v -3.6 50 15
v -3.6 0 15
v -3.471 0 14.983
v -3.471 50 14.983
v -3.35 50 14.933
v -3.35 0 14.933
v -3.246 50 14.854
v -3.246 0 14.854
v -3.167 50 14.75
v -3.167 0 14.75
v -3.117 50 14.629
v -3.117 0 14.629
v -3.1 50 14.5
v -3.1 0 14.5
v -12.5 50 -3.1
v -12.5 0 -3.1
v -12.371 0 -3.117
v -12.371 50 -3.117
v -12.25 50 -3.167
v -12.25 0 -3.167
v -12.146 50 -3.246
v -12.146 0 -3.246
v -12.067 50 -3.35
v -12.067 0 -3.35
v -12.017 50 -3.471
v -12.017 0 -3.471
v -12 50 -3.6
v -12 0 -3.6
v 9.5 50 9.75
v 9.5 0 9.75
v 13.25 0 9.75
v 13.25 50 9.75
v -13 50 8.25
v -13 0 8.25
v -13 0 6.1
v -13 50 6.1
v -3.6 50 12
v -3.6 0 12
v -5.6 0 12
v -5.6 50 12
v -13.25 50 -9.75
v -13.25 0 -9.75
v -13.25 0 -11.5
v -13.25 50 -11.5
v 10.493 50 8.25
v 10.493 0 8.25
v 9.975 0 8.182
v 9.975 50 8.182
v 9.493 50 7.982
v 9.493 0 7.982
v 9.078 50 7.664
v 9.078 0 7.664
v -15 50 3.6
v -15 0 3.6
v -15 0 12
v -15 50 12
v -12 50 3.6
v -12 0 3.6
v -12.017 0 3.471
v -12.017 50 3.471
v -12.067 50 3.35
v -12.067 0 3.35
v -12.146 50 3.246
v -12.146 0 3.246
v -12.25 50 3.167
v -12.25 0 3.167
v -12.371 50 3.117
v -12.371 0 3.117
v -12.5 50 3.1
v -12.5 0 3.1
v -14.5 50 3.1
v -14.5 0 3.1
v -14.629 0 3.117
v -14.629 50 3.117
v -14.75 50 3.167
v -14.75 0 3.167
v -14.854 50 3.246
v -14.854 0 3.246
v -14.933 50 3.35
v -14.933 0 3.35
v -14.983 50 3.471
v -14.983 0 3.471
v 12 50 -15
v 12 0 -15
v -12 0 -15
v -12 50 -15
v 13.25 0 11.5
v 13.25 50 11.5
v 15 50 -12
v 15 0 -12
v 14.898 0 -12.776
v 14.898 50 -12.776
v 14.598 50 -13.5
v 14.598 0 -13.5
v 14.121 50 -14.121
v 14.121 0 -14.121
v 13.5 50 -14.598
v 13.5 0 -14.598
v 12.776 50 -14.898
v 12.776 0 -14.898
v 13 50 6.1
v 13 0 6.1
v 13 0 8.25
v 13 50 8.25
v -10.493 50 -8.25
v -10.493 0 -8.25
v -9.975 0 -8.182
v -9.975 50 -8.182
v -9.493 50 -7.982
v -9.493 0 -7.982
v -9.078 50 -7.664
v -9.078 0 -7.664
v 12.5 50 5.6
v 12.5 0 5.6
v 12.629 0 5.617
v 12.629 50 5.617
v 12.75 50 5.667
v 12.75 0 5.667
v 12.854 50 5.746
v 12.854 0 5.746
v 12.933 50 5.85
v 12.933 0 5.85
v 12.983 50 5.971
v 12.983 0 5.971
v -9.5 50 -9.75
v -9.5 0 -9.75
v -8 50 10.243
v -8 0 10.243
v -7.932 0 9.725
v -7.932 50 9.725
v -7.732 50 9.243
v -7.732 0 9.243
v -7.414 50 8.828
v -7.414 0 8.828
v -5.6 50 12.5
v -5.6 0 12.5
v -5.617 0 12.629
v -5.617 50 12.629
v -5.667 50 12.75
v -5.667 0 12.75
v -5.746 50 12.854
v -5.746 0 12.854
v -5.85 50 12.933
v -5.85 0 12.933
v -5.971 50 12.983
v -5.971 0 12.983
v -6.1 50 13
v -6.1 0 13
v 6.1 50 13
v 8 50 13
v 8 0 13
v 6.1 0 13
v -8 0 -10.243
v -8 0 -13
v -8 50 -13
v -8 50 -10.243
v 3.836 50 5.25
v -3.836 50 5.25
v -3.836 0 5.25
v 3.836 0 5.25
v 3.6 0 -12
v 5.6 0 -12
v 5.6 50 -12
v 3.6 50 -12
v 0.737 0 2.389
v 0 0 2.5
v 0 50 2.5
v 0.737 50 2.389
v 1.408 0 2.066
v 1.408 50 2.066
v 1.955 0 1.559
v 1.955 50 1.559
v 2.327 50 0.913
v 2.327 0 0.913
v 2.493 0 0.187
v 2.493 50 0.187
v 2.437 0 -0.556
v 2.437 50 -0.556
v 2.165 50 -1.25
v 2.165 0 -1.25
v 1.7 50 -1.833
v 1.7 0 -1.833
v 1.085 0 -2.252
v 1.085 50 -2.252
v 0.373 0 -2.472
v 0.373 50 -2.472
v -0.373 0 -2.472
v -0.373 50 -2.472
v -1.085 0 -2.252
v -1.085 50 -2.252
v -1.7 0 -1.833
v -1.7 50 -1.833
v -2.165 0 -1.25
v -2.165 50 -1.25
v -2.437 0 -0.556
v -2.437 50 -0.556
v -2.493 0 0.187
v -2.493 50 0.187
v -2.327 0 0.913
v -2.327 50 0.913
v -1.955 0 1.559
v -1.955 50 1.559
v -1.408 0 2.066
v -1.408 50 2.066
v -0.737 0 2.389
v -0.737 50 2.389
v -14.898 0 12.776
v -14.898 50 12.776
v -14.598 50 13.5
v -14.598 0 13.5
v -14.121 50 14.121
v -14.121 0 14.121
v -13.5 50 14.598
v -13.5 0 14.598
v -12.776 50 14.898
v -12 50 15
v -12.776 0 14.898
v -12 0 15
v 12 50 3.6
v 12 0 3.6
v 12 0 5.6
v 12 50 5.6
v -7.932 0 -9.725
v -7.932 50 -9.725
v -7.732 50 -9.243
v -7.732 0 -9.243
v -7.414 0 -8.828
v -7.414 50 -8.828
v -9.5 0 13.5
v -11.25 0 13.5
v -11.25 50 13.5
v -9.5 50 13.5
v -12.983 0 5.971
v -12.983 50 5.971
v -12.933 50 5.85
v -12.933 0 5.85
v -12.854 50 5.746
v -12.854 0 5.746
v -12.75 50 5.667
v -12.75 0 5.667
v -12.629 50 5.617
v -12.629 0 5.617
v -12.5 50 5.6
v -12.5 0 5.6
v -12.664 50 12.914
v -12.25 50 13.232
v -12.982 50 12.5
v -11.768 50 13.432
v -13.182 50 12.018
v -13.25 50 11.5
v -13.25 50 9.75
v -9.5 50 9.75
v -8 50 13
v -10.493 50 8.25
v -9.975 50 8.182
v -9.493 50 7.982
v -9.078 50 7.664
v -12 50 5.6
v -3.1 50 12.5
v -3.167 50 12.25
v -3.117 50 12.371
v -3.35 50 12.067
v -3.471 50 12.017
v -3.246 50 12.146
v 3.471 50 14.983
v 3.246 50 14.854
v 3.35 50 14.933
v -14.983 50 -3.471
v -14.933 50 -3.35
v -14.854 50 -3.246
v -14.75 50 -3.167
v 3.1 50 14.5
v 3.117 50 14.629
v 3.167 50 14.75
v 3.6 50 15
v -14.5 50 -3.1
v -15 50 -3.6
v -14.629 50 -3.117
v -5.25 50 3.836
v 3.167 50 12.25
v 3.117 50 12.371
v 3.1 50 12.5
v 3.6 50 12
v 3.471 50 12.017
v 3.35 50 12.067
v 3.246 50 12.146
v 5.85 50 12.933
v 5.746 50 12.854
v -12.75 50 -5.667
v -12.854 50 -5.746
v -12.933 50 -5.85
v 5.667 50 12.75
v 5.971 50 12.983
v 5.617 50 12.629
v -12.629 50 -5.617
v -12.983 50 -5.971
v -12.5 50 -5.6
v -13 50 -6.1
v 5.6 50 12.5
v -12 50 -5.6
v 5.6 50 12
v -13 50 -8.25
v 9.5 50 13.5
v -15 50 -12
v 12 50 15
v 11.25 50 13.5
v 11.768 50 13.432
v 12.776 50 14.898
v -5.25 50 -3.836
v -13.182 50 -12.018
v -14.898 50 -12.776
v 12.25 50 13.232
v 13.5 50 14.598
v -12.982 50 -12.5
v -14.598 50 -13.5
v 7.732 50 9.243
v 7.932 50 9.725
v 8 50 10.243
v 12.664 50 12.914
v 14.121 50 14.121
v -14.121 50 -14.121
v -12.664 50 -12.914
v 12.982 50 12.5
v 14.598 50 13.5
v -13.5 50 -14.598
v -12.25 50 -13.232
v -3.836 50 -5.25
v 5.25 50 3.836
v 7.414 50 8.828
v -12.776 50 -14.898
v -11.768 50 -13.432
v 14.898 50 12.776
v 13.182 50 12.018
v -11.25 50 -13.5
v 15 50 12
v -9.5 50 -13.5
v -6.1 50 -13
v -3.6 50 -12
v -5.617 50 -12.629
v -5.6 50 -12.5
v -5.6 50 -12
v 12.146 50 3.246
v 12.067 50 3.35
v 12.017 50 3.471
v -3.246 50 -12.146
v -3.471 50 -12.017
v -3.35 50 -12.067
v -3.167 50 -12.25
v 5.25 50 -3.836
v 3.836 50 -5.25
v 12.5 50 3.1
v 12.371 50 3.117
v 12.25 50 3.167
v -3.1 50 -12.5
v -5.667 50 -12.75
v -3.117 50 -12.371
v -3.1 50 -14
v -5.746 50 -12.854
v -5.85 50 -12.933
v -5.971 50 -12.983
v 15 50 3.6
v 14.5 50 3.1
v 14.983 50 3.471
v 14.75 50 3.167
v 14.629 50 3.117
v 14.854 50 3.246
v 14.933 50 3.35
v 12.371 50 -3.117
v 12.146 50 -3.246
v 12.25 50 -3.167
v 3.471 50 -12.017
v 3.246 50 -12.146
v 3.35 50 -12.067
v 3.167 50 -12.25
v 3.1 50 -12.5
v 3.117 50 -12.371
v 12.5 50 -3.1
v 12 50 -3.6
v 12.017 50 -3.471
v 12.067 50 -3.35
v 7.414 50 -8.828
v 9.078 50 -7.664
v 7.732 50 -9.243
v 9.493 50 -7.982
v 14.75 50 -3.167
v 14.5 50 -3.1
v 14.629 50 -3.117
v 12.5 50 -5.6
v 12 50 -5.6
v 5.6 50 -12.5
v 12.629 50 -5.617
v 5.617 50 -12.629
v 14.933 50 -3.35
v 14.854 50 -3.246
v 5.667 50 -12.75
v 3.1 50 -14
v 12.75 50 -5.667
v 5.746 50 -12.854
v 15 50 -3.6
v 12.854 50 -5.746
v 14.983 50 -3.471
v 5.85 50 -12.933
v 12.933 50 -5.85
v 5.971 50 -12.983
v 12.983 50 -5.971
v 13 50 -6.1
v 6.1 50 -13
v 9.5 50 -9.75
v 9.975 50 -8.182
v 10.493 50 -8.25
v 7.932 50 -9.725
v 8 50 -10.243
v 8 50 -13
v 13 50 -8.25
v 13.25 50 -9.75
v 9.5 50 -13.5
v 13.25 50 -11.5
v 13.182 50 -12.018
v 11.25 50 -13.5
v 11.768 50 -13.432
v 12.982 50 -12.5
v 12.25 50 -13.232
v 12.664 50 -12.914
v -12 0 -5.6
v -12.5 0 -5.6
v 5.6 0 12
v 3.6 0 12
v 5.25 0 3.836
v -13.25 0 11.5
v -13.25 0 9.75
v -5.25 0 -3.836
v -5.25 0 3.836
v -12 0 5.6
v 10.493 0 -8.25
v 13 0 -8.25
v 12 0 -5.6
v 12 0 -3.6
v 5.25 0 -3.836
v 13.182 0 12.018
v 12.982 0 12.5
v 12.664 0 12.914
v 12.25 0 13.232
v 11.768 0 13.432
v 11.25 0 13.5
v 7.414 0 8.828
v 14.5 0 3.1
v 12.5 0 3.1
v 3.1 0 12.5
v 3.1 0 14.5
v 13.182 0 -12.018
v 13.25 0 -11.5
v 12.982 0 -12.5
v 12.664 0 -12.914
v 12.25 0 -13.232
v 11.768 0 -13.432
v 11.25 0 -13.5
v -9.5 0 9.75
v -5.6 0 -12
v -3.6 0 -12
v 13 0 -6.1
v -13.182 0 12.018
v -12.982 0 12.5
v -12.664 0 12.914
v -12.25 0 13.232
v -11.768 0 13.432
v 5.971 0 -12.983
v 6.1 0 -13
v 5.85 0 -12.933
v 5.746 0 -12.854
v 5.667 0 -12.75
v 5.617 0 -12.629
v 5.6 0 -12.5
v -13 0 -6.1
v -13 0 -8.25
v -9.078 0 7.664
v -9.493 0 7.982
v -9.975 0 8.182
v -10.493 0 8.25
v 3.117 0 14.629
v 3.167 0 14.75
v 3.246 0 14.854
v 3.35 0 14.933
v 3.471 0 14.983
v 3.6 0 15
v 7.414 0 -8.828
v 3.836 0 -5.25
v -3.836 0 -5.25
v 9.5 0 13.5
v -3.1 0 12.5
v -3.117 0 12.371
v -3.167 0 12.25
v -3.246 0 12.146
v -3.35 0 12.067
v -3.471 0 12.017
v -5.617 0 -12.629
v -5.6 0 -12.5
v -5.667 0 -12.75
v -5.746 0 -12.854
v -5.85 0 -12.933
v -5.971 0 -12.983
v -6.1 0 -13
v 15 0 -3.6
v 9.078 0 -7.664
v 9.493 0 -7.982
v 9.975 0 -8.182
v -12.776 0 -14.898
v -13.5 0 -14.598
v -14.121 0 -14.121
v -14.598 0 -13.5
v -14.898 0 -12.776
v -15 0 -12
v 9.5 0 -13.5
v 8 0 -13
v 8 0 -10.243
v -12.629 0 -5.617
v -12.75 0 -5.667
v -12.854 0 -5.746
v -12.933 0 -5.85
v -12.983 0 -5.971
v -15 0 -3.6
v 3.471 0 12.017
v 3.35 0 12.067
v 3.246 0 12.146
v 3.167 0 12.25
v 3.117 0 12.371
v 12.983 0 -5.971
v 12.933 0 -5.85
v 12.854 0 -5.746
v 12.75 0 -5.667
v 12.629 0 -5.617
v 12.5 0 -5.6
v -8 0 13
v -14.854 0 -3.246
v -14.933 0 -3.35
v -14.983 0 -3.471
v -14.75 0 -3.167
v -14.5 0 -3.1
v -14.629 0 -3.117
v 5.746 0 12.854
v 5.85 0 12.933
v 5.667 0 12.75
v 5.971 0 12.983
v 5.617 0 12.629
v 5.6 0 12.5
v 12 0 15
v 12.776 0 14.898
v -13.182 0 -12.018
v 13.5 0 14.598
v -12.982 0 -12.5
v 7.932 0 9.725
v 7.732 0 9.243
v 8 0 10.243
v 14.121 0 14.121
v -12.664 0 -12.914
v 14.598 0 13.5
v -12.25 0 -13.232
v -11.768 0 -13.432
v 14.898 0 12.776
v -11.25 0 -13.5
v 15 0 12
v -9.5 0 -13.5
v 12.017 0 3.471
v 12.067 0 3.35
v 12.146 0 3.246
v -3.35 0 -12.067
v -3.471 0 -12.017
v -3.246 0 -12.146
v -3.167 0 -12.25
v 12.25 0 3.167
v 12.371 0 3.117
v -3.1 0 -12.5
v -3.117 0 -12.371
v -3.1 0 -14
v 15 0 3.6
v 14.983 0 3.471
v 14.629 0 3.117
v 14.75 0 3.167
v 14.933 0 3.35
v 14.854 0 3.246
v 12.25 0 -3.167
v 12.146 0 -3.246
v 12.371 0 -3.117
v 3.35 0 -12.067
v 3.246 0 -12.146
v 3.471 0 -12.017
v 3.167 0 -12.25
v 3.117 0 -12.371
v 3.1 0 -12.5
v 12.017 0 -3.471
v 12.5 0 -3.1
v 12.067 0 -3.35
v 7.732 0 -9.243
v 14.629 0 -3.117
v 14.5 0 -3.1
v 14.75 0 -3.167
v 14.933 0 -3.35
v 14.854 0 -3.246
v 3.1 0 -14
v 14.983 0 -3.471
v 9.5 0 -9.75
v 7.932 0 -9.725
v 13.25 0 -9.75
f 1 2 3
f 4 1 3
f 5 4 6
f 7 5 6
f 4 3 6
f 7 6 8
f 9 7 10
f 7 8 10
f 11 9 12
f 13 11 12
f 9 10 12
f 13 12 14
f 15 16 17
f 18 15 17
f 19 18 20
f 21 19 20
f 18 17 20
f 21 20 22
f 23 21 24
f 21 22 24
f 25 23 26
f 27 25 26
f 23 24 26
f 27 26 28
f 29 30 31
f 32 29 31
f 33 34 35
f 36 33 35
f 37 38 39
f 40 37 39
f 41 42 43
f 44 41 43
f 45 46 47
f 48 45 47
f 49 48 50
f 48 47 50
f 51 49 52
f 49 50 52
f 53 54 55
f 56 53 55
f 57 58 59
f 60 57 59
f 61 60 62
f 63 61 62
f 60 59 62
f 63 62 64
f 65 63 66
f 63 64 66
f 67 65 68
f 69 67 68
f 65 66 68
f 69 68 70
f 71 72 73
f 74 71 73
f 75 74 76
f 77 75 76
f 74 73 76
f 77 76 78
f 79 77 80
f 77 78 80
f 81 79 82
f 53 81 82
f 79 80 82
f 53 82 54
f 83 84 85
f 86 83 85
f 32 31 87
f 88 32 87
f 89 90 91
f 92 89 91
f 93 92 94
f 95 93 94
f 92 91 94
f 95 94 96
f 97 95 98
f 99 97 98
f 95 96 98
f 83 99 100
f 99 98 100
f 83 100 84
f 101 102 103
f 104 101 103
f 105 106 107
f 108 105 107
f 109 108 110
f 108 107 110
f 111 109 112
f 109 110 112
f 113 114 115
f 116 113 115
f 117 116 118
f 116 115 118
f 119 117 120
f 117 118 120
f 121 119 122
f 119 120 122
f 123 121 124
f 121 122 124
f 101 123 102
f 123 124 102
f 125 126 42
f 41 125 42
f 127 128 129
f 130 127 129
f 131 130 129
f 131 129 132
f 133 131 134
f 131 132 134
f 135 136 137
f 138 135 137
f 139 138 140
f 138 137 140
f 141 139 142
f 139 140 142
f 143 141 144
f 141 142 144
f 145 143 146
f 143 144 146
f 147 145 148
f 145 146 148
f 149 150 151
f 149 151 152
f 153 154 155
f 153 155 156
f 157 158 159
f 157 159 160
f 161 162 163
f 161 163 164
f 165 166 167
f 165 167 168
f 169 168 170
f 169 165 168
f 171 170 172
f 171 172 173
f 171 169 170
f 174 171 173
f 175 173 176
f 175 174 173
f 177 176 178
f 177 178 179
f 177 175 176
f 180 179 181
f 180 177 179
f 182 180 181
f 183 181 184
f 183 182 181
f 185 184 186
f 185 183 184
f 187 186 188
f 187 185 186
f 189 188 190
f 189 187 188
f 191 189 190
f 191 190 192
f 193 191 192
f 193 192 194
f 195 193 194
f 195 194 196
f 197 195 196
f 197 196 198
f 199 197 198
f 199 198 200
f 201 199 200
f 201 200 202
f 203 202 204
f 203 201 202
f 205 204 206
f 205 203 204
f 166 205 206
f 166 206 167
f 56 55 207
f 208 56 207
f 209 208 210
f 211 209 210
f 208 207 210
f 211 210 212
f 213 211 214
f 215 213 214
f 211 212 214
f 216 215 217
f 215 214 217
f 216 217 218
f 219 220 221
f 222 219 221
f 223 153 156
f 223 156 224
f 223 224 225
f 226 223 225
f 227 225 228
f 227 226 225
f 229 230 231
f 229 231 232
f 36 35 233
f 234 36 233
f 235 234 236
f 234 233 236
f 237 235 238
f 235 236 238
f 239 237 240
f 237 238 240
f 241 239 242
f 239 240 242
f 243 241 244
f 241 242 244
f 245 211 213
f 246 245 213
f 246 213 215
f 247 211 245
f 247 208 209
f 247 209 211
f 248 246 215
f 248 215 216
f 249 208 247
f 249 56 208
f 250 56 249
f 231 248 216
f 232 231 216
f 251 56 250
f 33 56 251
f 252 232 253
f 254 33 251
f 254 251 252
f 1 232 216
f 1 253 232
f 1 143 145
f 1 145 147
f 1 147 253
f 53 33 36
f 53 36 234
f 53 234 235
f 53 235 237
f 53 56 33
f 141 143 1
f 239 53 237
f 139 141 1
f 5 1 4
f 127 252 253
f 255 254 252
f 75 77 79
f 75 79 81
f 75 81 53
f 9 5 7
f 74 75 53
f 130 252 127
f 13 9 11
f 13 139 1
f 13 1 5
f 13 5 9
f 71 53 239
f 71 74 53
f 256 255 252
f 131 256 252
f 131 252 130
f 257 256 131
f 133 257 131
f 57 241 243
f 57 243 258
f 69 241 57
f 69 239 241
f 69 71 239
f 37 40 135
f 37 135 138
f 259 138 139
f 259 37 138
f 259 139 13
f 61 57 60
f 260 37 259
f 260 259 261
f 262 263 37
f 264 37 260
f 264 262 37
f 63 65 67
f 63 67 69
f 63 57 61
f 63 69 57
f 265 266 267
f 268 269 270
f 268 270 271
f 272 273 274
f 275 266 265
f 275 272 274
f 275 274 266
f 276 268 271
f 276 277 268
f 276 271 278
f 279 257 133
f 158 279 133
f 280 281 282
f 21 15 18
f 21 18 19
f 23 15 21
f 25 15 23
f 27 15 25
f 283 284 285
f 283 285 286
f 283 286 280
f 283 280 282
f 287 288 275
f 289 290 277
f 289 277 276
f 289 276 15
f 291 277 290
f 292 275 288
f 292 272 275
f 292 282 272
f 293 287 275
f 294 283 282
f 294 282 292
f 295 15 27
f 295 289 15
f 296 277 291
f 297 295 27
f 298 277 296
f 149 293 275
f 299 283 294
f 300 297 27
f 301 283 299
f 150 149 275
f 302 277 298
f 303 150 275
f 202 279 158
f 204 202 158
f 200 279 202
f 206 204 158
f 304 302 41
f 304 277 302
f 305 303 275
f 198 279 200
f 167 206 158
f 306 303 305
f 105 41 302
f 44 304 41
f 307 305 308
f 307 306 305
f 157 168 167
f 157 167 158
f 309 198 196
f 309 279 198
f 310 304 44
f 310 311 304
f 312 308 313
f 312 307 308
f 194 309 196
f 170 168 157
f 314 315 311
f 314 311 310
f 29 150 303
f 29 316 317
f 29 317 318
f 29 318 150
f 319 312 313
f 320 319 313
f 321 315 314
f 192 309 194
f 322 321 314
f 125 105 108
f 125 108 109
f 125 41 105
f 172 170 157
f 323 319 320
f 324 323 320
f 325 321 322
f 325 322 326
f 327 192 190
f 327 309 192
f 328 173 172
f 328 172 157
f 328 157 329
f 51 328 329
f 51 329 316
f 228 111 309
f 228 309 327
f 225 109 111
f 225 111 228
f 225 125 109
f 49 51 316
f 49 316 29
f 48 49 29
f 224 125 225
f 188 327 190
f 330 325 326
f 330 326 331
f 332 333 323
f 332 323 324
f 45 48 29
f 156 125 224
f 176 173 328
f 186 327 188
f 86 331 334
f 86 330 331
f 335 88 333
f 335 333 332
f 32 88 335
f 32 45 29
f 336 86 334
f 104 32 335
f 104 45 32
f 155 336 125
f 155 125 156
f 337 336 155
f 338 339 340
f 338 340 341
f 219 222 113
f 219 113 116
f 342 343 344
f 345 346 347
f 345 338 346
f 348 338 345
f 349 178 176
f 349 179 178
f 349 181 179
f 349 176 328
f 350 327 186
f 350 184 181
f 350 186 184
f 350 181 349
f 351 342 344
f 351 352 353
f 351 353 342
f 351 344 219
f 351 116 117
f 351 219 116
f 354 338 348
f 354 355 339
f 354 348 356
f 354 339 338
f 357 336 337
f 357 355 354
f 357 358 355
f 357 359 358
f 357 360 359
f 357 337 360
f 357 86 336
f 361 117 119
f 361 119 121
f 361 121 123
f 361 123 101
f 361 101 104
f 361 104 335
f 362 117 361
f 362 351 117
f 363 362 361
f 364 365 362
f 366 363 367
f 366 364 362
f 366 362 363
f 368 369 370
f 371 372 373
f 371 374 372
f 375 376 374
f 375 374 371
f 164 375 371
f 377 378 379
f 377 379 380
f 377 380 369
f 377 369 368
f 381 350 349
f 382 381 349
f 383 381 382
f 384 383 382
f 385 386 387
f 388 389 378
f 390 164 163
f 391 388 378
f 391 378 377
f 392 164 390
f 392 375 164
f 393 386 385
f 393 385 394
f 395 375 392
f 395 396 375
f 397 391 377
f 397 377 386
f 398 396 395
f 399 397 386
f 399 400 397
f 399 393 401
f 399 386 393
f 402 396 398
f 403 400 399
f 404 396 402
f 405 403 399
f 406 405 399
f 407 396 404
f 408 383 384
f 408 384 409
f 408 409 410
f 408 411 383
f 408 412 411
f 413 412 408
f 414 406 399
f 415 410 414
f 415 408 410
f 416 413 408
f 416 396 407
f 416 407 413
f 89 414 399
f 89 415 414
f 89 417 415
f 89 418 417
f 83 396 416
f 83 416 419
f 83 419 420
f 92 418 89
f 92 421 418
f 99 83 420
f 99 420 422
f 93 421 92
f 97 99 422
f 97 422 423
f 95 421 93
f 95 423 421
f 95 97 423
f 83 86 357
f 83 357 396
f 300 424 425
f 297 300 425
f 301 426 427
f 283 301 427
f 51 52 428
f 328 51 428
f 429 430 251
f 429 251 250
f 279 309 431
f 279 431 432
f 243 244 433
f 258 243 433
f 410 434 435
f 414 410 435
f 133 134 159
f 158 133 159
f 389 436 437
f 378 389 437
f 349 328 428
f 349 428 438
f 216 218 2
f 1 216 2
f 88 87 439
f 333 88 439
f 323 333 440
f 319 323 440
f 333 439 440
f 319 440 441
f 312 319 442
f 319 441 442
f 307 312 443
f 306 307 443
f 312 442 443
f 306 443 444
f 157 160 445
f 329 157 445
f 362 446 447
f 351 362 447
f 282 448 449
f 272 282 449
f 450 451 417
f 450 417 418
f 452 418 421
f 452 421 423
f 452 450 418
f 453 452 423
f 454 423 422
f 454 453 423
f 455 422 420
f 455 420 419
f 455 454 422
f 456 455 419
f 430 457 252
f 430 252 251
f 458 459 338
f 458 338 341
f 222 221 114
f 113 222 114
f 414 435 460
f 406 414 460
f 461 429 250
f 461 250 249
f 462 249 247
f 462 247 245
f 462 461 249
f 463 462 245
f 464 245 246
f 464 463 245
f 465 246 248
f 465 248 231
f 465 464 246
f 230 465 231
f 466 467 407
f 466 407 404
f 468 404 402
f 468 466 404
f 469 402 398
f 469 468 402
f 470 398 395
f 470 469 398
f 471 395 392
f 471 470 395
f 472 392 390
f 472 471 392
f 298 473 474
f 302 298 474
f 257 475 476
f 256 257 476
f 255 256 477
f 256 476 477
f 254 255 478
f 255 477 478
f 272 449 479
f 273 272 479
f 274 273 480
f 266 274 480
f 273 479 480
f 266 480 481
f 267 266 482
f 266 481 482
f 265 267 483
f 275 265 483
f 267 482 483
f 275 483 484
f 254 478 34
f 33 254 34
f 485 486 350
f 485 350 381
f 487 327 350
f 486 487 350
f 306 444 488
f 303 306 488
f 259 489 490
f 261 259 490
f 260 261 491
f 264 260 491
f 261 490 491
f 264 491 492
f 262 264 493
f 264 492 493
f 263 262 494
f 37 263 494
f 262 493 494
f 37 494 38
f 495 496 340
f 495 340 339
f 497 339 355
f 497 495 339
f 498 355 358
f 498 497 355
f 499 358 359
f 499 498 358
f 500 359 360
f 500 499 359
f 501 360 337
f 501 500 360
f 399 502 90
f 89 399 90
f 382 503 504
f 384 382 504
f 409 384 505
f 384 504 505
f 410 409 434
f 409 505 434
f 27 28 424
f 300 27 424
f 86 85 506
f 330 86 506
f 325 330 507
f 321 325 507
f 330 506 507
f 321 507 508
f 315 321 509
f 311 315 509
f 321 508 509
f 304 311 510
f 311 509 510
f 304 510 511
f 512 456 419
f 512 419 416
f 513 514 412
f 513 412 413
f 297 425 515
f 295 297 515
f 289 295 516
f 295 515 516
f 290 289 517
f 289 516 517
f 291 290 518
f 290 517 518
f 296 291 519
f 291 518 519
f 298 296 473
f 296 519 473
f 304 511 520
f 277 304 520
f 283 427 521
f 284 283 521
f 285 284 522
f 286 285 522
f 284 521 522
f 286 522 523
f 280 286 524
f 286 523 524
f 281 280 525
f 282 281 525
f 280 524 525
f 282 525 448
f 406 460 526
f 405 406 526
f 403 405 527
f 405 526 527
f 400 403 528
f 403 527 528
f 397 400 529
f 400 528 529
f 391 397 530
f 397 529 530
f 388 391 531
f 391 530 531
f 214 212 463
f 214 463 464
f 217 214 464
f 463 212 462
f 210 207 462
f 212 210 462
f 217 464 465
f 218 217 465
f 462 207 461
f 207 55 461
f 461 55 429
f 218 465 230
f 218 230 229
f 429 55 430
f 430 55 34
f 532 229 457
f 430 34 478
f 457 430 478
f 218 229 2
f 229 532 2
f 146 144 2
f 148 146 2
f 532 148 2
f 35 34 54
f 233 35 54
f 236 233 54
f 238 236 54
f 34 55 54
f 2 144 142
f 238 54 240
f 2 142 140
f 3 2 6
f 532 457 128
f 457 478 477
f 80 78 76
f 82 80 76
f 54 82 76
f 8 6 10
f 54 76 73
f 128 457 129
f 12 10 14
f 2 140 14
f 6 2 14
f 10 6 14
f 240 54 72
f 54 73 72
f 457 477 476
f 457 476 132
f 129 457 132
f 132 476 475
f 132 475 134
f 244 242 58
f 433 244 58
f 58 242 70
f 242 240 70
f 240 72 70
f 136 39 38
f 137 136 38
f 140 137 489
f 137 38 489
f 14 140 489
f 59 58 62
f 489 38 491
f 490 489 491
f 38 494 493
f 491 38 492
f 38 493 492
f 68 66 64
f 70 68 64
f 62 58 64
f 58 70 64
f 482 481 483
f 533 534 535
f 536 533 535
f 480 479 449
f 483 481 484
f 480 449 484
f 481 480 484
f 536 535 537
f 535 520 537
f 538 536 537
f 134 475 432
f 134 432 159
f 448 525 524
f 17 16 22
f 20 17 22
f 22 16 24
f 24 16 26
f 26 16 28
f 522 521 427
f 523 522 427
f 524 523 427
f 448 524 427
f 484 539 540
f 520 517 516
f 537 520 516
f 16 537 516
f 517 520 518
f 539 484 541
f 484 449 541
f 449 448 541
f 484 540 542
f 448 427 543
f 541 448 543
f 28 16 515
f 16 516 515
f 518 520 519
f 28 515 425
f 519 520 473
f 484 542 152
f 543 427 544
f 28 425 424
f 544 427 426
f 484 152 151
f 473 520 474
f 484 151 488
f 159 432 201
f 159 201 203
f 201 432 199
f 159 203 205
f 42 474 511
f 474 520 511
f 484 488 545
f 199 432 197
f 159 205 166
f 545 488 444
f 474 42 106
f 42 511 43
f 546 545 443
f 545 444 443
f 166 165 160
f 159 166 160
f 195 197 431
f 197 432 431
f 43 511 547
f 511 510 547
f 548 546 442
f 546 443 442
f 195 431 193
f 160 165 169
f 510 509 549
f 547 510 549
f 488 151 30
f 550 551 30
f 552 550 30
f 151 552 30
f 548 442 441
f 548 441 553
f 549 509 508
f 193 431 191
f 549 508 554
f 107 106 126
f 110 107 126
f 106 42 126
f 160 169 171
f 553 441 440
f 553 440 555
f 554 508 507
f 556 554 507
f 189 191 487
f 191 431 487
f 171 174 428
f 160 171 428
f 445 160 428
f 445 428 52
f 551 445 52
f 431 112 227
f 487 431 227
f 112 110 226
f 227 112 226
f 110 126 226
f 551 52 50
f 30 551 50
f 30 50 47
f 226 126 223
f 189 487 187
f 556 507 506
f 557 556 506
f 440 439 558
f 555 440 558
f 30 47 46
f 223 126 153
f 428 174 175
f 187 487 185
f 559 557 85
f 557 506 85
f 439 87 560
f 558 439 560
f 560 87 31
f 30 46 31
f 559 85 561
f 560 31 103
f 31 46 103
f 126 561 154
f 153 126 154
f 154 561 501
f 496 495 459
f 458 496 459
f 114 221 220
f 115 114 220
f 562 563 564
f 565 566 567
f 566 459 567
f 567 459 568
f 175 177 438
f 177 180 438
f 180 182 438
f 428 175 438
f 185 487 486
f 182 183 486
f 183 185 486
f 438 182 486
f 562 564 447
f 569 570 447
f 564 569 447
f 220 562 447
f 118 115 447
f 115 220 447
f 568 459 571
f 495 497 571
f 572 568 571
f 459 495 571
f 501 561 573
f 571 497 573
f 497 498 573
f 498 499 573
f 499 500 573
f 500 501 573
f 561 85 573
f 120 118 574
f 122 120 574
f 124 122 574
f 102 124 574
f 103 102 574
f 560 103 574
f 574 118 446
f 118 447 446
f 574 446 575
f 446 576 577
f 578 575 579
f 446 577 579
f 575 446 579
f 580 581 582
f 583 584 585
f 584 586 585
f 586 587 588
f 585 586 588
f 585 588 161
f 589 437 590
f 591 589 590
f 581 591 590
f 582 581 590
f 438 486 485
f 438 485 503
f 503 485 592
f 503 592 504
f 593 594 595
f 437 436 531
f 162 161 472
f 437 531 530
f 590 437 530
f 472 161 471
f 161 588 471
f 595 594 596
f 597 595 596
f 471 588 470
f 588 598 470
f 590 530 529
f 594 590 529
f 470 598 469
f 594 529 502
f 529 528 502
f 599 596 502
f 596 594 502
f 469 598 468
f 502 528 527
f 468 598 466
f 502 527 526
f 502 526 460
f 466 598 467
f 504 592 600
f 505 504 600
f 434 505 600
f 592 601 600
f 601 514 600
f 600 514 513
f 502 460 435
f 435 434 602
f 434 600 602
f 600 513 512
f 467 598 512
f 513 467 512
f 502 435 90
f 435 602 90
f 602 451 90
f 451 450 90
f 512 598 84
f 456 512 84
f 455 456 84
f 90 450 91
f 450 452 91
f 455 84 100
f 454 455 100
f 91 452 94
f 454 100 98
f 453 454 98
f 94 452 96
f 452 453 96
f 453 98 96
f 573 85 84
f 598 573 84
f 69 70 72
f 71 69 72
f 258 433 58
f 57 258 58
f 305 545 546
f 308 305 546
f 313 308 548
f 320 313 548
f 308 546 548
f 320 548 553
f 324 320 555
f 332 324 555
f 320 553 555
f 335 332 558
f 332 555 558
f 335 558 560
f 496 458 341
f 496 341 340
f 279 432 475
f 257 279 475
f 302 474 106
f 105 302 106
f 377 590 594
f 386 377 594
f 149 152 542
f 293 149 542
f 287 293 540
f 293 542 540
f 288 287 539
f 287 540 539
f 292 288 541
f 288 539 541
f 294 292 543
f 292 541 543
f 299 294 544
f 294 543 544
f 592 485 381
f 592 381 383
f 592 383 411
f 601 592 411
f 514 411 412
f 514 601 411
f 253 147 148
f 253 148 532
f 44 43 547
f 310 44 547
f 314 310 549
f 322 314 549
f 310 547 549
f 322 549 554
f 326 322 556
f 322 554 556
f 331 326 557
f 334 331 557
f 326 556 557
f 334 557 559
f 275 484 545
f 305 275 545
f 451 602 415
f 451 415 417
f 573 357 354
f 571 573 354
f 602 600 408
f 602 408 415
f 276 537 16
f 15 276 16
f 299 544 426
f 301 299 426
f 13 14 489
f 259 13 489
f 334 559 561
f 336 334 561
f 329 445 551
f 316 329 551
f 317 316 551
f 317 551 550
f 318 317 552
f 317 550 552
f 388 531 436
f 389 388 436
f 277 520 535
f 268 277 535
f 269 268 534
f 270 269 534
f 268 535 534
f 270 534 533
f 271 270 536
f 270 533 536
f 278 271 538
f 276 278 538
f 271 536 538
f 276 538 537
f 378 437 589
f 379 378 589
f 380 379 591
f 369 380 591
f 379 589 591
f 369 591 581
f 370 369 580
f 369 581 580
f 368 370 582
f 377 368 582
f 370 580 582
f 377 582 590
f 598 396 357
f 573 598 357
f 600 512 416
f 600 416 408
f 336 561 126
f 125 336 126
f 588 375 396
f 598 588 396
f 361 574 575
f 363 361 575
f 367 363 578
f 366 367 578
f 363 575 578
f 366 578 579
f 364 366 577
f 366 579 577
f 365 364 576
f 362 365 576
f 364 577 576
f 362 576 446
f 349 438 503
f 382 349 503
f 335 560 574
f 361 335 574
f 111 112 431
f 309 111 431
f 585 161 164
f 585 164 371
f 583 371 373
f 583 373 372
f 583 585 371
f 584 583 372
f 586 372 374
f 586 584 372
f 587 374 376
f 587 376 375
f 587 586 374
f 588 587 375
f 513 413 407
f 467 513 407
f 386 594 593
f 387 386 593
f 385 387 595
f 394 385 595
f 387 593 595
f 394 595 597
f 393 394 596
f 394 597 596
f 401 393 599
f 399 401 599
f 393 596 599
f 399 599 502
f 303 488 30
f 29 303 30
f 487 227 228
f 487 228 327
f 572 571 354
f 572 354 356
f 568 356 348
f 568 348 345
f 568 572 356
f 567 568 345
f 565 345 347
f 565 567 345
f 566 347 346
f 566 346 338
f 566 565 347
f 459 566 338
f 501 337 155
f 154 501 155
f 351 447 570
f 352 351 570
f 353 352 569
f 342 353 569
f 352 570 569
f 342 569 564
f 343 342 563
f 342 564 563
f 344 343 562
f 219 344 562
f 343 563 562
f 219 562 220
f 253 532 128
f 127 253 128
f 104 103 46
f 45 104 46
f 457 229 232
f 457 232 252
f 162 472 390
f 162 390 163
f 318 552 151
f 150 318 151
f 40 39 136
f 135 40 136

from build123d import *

# Parameters (mm, degrees)
SKETCH2_R           = 2.5
BOSS_EXTRUDE1_DEPTH = 50


with BuildPart() as part:
    # Sketch2 → Boss-Extrude1 (new body)
    with BuildSketch(Plane(origin=(0, 0, 0), x_dir=(1, 0, 0), z_dir=(0, 1, 0))):
        with BuildLine():
            Line((3.6, -15), (12, -15))
            ThreePointArc((12, -15), (14.121320344, -14.121320344), (15, -12))
            Line((15, -12), (15, -3.6))
            ThreePointArc((15, -3.6), (14.853553391, -3.246446609), (14.5, -3.1))
            Line((14.5, -3.1), (12.5, -3.1))
            ThreePointArc((12.5, -3.1), (12.146446609, -3.246446609), (12, -3.6))
            Line((12, -3.6), (12, -5.6))
            Line((12, -5.6), (12.5, -5.6))
            ThreePointArc((12.5, -5.6), (12.853553391, -5.746446609), (13, -6.1))
            Line((13, -6.1), (13, -8.25))
            Line((13, -8.25), (10.492640687, -8.25))
            ThreePointArc((10.492640687, -8.25), (9.727273822, -8.097759065), (9.078427125, -7.664213562))
            Line((9.078427125, -7.664213562), (5.25, -3.835786438))
            Line((5.25, -3.835786438), (5.25, 3.835786438))
            Line((5.25, 3.835786438), (9.078427125, 7.664213562))
            ThreePointArc((9.078427125, 7.664213562), (9.727273822, 8.097759065), (10.492640687, 8.25))
            Line((10.492640687, 8.25), (13, 8.25))
            Line((13, 8.25), (13, 6.1))
            ThreePointArc((13, 6.1), (12.853553391, 5.746446609), (12.5, 5.6))
            Line((12.5, 5.6), (12, 5.6))
            Line((12, 5.6), (12, 3.6))
            ThreePointArc((12, 3.6), (12.146446609, 3.246446609), (12.5, 3.1))
            Line((12.5, 3.1), (14.5, 3.1))
            ThreePointArc((14.5, 3.1), (14.853553391, 3.246446609), (15, 3.6))
            Line((15, 3.6), (15, 12))
            ThreePointArc((15, 12), (14.121320344, 14.121320344), (12, 15))
            Line((12, 15), (-12, 15))
            ThreePointArc((-12, 15), (-14.121320344, 14.121320344), (-15, 12))
            Line((-15, 12), (-15, 3.6))
            ThreePointArc((-15, 3.6), (-14.853553391, 3.246446609), (-14.5, 3.1))
            Line((-14.5, 3.1), (-12.5, 3.1))
            ThreePointArc((-12.5, 3.1), (-12.146446609, 3.246446609), (-12, 3.6))
            Line((-12, 3.6), (-12, 5.6))
            Line((-12, 5.6), (-12.5, 5.6))
            ThreePointArc((-12.5, 5.6), (-12.853553391, 5.746446609), (-13, 6.1))
            Line((-13, 6.1), (-13, 8.25))
            Line((-13, 8.25), (-10.492640687, 8.25))
            ThreePointArc((-10.492640687, 8.25), (-9.727273822, 8.097759065), (-9.078427125, 7.664213562))
            Line((-9.078427125, 7.664213562), (-5.25, 3.835786438))
            Line((-5.25, 3.835786438), (-5.25, -3.835786438))
            Line((-5.25, -3.835786438), (-9.078427125, -7.664213562))
            ThreePointArc((-9.078427125, -7.664213562), (-9.727273822, -8.097759065), (-10.492640687, -8.25))
            Line((-10.492640687, -8.25), (-13, -8.25))
            Line((-13, -8.25), (-13, -6.1))
            ThreePointArc((-13, -6.1), (-12.853553391, -5.746446609), (-12.5, -5.6))
            Line((-12.5, -5.6), (-12, -5.6))
            Line((-12, -5.6), (-12, -3.6))
            ThreePointArc((-12, -3.6), (-12.146446609, -3.246446609), (-12.5, -3.1))
            Line((-12.5, -3.1), (-14.5, -3.1))
            ThreePointArc((-14.5, -3.1), (-14.853553391, -3.246446609), (-15, -3.6))
            Line((-15, -3.6), (-15, -12))
            ThreePointArc((-15, -12), (-14.121320344, -14.121320344), (-12, -15))
            Line((-12, -15), (-3.6, -15))
            ThreePointArc((-3.6, -15), (-3.246446609, -14.853553391), (-3.1, -14.5))
            Line((-3.1, -14.5), (-3.1, -12.5))
            ThreePointArc((-3.1, -12.5), (-3.246446609, -12.146446609), (-3.6, -12))
            Line((-3.6, -12), (-5.6, -12))
            Line((-5.6, -12), (-5.6, -12.5))
            ThreePointArc((-5.6, -12.5), (-5.746446609, -12.853553391), (-6.1, -13))
            Line((-6.1, -13), (-8, -13))
            Line((-8, -13), (-8, -10.242640687))
            ThreePointArc((-8, -10.242640687), (-7.847759065, -9.477273822), (-7.414213562, -8.828427125))
            Line((-7.414213562, -8.828427125), (-3.835786438, -5.25))
            Line((-3.835786438, -5.25), (3.835786438, -5.25))
            Line((3.835786438, -5.25), (7.414213562, -8.828427125))
            ThreePointArc((7.414213562, -8.828427125), (7.847759065, -9.477273822), (8, -10.242640687))
            Line((8, -10.242640687), (8, -13))
            Line((8, -13), (6.1, -13))
            ThreePointArc((6.1, -13), (5.746446609, -12.853553391), (5.6, -12.5))
            Line((5.6, -12.5), (5.6, -12))
            Line((5.6, -12), (3.6, -12))
            ThreePointArc((3.6, -12), (3.246446609, -12.146446609), (3.1, -12.5))
            Line((3.1, -12.5), (3.1, -14.5))
            ThreePointArc((3.1, -14.5), (3.246446609, -14.853553391), (3.6, -15))
        make_face()
        with Locations(Location((0, 0, 0), (0, 0, 270))):
            Circle(SKETCH2_R, mode=Mode.SUBTRACT)
        with BuildLine():
            Line((-3.835786438, 5.25), (3.835786438, 5.25))
            Line((3.835786438, 5.25), (7.414213562, 8.828427125))
            ThreePointArc((7.414213562, 8.828427125), (7.847759065, 9.477273822), (8, 10.242640687))
            Line((8, 10.242640687), (8, 13))
            Line((8, 13), (6.1, 13))
            ThreePointArc((6.1, 13), (5.746446609, 12.853553391), (5.6, 12.5))
            Line((5.6, 12.5), (5.6, 12))
            Line((5.6, 12), (3.6, 12))
            ThreePointArc((3.6, 12), (3.246446609, 12.146446609), (3.1, 12.5))
            Line((3.1, 12.5), (3.1, 14))
            Line((3.1, 14), (-3.1, 14))
            Line((-3.1, 14), (-3.1, 12.5))
            ThreePointArc((-3.1, 12.5), (-3.246446609, 12.146446609), (-3.6, 12))
            Line((-3.6, 12), (-5.6, 12))
            Line((-5.6, 12), (-5.6, 12.5))
            ThreePointArc((-5.6, 12.5), (-5.746446609, 12.853553391), (-6.1, 13))
            Line((-6.1, 13), (-8, 13))
            Line((-8, 13), (-8, 10.242640687))
            ThreePointArc((-8, 10.242640687), (-7.847759065, 9.477273822), (-7.414213562, 8.828427125))
            Line((-7.414213562, 8.828427125), (-3.835786438, 5.25))
        make_face(mode=Mode.SUBTRACT)
        with BuildLine():
            Line((9.5, -9.75), (13.25, -9.75))
            Line((13.25, -9.75), (13.25, -11.5))
            ThreePointArc((13.25, -11.5), (12.664213562, -12.914213562), (11.25, -13.5))
            Line((11.25, -13.5), (9.5, -13.5))
            Line((9.5, -13.5), (9.5, -9.75))
        make_face(mode=Mode.SUBTRACT)
        with BuildLine():
            Line((-13.25, -9.75), (-13.25, -11.5))
            ThreePointArc((-13.25, -11.5), (-12.664213562, -12.914213562), (-11.25, -13.5))
            Line((-11.25, -13.5), (-9.5, -13.5))
            Line((-9.5, -13.5), (-9.5, -9.75))
            Line((-9.5, -9.75), (-13.25, -9.75))
        make_face(mode=Mode.SUBTRACT)
        with BuildLine():
            Line((-9.5, 9.75), (-13.25, 9.75))
            Line((-13.25, 9.75), (-13.25, 11.5))
            ThreePointArc((-13.25, 11.5), (-12.664213562, 12.914213562), (-11.25, 13.5))
            Line((-11.25, 13.5), (-9.5, 13.5))
            Line((-9.5, 13.5), (-9.5, 9.75))
        make_face(mode=Mode.SUBTRACT)
        with BuildLine():
            Line((13.25, 9.75), (13.25, 11.5))
            ThreePointArc((13.25, 11.5), (12.664213562, 12.914213562), (11.25, 13.5))
            Line((11.25, 13.5), (9.5, 13.5))
            Line((9.5, 13.5), (9.5, 9.75))
            Line((9.5, 9.75), (13.25, 9.75))
        make_face(mode=Mode.SUBTRACT)
    extrude(amount=BOSS_EXTRUDE1_DEPTH)


solid = part.part
